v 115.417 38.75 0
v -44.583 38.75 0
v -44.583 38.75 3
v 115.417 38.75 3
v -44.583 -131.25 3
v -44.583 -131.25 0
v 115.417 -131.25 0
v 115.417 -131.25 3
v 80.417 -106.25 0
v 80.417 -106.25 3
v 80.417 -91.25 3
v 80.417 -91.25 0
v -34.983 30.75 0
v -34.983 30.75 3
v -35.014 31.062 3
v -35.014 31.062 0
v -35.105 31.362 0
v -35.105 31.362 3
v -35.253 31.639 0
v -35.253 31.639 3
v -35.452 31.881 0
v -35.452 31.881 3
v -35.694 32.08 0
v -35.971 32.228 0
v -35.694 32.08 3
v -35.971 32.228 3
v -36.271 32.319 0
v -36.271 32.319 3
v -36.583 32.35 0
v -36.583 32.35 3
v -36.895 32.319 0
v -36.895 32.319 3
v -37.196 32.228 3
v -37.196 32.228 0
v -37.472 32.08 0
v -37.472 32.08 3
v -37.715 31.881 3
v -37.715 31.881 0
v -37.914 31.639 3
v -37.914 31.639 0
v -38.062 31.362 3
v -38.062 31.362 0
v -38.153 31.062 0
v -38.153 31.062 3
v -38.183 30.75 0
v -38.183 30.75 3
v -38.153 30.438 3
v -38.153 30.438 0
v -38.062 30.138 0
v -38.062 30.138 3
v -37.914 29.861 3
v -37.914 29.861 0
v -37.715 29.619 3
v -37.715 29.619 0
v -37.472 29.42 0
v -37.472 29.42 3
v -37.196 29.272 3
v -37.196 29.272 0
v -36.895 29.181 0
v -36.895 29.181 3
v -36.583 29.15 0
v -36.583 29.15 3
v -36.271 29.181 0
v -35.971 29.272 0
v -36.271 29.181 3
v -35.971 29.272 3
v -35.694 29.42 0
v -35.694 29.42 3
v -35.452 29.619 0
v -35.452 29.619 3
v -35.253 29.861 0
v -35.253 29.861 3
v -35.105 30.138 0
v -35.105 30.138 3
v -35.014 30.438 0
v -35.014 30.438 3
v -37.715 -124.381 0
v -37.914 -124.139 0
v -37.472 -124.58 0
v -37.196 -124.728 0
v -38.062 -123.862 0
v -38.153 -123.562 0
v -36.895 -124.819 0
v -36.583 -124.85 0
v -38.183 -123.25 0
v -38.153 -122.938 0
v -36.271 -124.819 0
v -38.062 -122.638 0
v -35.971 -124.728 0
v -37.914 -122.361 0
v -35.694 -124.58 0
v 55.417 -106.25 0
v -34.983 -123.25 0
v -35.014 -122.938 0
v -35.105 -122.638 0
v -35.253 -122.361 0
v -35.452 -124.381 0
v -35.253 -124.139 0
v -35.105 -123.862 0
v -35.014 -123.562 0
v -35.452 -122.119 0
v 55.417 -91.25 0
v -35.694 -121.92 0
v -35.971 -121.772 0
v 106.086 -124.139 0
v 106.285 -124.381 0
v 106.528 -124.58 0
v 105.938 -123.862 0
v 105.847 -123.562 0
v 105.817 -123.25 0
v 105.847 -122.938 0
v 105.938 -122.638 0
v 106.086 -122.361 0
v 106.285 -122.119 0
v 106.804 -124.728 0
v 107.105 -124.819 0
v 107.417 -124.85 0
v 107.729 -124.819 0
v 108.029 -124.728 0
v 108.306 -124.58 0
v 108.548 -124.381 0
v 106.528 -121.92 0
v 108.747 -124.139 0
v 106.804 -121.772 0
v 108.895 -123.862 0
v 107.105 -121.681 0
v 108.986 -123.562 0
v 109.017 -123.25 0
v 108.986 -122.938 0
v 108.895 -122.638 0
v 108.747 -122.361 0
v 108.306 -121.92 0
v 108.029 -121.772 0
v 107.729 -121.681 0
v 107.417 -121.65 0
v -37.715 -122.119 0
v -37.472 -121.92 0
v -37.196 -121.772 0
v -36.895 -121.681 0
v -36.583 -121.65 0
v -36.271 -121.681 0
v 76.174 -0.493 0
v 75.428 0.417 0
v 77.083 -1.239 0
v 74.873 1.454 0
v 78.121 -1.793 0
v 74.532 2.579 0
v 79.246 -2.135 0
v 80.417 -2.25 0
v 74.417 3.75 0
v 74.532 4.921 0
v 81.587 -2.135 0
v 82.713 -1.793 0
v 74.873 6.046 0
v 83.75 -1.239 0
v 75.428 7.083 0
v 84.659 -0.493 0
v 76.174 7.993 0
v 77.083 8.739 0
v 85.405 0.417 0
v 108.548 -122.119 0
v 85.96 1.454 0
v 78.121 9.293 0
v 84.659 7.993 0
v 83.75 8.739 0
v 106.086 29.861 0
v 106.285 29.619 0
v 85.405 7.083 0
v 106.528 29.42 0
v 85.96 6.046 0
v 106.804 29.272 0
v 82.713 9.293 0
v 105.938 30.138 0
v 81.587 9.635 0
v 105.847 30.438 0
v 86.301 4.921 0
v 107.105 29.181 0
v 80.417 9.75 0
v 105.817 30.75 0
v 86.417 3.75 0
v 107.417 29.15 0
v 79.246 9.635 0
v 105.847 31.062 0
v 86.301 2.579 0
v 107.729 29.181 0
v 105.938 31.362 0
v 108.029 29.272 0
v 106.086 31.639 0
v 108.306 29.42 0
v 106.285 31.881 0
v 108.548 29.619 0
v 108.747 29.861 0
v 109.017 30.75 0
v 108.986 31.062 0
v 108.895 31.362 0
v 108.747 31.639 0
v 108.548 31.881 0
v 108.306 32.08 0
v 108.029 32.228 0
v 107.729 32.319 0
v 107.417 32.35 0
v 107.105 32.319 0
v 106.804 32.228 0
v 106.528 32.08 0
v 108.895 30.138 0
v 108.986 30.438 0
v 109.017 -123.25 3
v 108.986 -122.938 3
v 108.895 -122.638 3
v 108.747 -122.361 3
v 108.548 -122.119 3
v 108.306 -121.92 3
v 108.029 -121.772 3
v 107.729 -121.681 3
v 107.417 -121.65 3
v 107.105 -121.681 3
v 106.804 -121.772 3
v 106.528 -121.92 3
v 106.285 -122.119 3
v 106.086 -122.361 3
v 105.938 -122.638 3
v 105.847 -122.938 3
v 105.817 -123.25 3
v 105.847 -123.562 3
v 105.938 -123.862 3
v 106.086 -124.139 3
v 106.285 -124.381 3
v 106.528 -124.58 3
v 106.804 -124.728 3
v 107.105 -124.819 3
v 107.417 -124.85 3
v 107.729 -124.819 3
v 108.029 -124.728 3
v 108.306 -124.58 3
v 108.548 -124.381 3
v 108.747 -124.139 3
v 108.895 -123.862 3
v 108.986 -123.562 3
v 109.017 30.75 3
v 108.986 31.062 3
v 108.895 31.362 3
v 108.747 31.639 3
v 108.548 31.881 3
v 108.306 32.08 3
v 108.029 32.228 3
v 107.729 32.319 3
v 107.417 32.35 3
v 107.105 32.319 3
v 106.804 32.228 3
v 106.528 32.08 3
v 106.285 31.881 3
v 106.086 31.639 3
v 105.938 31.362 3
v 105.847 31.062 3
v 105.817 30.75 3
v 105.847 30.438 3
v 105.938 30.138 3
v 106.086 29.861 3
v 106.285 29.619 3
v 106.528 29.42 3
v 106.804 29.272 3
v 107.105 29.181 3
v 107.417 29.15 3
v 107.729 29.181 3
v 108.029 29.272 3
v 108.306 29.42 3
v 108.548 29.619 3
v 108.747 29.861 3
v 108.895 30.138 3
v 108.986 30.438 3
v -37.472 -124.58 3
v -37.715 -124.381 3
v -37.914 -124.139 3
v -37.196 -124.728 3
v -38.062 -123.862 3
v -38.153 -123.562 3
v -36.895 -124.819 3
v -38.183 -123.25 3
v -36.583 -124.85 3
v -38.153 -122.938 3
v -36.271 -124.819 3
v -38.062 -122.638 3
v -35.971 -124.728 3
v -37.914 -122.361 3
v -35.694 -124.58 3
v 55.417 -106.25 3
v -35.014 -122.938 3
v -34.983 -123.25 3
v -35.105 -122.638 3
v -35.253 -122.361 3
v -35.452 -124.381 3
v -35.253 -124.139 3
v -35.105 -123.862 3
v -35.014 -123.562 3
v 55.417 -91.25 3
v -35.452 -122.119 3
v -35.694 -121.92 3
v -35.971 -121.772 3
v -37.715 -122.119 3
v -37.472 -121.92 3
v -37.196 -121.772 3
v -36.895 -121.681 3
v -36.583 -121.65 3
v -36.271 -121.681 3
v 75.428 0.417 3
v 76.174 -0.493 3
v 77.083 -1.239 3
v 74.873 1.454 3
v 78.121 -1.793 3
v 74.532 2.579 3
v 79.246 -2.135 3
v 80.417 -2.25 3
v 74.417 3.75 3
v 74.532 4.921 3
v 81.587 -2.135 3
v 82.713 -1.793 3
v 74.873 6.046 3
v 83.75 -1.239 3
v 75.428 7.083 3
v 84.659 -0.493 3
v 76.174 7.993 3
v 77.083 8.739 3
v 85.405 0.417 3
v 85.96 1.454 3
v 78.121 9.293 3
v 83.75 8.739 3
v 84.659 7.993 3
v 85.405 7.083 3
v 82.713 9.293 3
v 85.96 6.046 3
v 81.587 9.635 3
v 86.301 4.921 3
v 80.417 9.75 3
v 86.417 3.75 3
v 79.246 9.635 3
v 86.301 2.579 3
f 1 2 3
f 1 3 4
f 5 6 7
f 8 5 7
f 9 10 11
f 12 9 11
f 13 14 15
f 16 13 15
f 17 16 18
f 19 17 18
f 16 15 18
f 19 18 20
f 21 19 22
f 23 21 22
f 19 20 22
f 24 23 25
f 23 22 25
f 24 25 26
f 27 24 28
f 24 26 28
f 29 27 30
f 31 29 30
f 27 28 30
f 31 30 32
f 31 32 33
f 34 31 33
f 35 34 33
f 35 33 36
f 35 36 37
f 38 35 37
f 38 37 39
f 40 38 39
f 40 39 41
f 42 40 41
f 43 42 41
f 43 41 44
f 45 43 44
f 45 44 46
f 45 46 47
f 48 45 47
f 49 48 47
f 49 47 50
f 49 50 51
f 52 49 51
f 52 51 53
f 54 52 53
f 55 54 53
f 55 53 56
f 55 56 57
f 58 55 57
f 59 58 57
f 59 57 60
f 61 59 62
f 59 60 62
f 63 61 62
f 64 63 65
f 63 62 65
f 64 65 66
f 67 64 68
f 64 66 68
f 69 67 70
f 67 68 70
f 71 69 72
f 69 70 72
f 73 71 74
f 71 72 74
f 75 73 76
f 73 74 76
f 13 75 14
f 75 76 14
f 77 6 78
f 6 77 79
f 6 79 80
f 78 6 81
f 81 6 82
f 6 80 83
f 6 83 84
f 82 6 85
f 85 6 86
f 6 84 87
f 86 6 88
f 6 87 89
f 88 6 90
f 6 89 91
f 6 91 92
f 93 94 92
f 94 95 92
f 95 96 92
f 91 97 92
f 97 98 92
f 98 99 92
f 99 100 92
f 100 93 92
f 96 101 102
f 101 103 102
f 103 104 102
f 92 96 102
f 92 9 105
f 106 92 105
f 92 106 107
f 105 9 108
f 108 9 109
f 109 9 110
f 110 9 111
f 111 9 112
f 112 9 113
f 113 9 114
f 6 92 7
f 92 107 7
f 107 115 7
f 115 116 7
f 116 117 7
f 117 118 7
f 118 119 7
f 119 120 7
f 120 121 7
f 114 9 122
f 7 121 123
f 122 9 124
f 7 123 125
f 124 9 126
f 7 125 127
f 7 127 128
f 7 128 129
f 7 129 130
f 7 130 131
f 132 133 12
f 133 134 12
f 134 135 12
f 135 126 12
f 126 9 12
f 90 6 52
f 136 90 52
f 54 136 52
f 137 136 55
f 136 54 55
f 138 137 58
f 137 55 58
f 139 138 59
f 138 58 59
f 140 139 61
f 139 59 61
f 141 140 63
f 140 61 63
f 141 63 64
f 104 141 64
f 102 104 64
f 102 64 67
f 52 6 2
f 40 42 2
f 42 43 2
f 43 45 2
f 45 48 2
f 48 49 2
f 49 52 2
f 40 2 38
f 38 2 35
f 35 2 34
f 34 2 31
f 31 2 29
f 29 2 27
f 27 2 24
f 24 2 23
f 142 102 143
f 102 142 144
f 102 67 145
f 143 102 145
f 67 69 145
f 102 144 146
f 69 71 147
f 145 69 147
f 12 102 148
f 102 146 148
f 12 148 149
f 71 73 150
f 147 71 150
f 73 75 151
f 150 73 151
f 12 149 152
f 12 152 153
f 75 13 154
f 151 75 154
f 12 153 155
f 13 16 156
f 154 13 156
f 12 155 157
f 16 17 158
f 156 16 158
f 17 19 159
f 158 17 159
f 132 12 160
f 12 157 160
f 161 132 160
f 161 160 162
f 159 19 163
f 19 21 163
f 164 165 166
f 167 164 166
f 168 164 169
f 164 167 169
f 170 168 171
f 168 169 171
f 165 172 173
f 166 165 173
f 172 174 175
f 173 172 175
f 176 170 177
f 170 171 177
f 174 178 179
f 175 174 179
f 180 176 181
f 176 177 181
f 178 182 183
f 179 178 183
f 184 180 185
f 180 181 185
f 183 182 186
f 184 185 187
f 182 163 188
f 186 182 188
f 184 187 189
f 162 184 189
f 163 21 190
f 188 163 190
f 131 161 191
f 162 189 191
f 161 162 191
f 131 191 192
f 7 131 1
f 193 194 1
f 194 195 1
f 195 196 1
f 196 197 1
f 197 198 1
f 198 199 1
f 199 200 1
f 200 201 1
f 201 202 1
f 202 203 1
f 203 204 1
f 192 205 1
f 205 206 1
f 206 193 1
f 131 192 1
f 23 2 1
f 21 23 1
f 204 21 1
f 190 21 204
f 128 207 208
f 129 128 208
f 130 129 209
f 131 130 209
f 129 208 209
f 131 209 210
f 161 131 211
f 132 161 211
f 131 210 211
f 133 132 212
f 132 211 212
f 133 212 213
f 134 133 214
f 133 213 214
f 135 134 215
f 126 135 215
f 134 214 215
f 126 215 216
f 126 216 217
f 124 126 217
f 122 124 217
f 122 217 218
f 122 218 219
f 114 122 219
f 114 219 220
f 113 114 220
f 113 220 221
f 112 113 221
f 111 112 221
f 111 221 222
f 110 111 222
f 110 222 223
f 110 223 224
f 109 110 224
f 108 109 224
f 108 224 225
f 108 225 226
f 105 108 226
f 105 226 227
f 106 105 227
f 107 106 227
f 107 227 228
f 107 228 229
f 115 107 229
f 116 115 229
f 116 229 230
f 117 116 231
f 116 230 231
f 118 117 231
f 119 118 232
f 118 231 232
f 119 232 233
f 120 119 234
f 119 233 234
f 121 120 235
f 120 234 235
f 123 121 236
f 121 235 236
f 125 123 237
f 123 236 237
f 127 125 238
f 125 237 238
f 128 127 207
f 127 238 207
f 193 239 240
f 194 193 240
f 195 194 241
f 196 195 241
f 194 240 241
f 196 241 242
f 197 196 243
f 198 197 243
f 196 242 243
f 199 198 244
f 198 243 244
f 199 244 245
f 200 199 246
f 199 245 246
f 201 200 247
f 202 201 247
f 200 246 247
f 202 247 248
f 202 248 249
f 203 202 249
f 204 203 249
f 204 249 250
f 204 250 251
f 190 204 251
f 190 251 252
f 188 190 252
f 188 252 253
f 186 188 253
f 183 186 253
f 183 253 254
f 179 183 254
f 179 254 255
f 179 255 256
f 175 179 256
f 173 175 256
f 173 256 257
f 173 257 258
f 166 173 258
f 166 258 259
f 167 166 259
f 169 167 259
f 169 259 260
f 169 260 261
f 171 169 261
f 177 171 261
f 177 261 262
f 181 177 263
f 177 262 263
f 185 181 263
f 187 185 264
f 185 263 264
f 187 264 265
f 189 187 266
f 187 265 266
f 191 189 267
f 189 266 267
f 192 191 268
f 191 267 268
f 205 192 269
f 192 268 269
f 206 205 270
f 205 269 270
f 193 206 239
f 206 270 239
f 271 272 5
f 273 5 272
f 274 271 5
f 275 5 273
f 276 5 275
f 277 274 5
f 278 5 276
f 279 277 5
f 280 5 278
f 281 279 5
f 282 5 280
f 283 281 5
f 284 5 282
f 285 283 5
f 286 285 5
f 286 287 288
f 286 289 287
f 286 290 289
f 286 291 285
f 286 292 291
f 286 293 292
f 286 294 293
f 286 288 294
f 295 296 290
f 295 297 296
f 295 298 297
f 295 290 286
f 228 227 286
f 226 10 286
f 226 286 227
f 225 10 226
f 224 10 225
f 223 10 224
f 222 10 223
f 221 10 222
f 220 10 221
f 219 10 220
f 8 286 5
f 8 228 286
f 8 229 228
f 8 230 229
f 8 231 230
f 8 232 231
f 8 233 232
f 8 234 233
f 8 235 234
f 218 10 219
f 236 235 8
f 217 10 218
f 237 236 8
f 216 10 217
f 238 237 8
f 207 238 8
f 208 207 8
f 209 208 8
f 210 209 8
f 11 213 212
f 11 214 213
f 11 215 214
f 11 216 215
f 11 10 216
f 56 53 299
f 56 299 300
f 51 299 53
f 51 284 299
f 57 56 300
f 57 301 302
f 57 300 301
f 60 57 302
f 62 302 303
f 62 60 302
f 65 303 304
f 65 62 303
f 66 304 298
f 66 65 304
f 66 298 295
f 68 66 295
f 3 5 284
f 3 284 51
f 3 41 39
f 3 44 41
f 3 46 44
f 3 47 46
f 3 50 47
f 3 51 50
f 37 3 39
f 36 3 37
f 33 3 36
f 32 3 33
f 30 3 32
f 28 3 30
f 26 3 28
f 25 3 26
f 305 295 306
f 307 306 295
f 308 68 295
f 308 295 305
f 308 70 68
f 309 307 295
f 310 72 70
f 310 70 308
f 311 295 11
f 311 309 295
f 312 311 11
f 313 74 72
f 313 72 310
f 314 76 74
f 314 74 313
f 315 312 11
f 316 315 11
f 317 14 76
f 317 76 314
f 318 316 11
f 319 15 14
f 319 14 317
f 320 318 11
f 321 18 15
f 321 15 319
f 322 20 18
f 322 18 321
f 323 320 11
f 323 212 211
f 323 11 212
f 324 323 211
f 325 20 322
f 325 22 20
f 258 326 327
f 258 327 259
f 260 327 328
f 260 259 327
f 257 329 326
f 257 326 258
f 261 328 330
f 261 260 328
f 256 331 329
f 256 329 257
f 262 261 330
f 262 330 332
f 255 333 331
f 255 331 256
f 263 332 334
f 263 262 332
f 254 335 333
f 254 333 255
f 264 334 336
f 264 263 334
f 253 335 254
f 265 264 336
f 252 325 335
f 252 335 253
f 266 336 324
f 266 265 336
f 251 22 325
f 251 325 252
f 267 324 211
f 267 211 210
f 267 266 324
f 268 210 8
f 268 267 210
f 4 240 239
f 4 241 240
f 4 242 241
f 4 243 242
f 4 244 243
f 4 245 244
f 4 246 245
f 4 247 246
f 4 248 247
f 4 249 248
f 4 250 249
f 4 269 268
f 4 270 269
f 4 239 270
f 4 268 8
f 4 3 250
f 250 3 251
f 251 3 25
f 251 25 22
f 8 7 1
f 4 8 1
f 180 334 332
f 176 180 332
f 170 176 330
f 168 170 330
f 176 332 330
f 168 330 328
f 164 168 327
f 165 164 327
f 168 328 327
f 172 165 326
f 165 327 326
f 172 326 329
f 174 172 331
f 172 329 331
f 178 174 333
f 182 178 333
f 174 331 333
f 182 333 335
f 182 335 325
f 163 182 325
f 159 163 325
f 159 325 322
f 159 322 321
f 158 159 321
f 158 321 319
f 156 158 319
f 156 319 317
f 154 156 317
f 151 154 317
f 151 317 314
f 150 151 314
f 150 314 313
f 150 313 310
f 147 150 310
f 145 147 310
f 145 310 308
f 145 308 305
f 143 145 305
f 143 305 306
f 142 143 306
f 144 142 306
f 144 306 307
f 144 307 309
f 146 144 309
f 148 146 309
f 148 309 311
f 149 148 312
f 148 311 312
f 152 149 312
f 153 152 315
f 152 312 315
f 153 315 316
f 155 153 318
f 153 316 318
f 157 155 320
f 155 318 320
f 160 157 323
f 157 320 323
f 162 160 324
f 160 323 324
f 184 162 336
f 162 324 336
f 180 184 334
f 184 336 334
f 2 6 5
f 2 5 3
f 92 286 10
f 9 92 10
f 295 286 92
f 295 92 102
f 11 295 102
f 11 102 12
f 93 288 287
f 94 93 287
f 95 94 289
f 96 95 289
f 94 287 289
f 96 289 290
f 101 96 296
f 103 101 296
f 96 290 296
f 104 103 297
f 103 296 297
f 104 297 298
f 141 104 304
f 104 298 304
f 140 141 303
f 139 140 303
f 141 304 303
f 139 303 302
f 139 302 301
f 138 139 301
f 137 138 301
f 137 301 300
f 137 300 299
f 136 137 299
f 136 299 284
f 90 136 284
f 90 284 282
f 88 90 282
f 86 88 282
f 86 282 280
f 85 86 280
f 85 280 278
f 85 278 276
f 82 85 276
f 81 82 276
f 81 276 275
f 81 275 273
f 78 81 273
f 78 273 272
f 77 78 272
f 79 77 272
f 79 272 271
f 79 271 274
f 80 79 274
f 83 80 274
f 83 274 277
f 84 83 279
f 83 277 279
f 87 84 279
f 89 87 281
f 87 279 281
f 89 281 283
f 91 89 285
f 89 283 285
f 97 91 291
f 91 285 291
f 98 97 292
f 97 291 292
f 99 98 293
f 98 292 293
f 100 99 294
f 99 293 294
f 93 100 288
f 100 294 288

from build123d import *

# Parameters (mm, degrees)
SKETCH_1_W          = 160
SKETCH_1_H          = 170
EXTRUDE_1_DEPTH     = 3
SKETCH_2_R          = 1.6
CUT_EXTRUDE_1_DEPTH = 13
SKETCH_3_R          = 6
CUT_EXTRUDE_2_DEPTH = 13
SKETCH_4_W          = 25
SKETCH_4_H          = 15
CUT_EXTRUDE_3_DEPTH = 13


with BuildPart() as part:
    # 草图1 → 凸台-拉伸1 (new body)
    with BuildSketch(Plane.XY):
        with Locations((35.416666667, -46.25)):
            Rectangle(SKETCH_1_W, SKETCH_1_H)
    extrude(amount=EXTRUDE_1_DEPTH)

    # 草图2 → 切除-拉伸1 (cut)
    with BuildSketch(Plane.XY.offset(3)):
        with Locations((-36.583333333, 30.75)):
            Circle(SKETCH_2_R)
        with Locations((107.416666667, 30.75)):
            Circle(SKETCH_2_R)
        with Locations((107.416666667, -123.25)):
            Circle(SKETCH_2_R)
        with Locations((-36.583333333, -123.25)):
            Circle(SKETCH_2_R)
    extrude(amount=-CUT_EXTRUDE_1_DEPTH, mode=Mode.SUBTRACT)

    # 草图3 → 切除-拉伸2 (cut)
    with BuildSketch(Plane.XY.offset(3)):
        with Locations((80.416666667, 3.75)):
            Circle(SKETCH_3_R)
    extrude(amount=-CUT_EXTRUDE_2_DEPTH, mode=Mode.SUBTRACT)

    # 草图4 → 切除-拉伸3 (cut)
    with BuildSketch(Plane.XY.offset(3)):
        with Locations((67.916666667, -98.75)):
            Rectangle(SKETCH_4_W, SKETCH_4_H)
    extrude(amount=-CUT_EXTRUDE_3_DEPTH, mode=Mode.SUBTRACT)


solid = part.part
